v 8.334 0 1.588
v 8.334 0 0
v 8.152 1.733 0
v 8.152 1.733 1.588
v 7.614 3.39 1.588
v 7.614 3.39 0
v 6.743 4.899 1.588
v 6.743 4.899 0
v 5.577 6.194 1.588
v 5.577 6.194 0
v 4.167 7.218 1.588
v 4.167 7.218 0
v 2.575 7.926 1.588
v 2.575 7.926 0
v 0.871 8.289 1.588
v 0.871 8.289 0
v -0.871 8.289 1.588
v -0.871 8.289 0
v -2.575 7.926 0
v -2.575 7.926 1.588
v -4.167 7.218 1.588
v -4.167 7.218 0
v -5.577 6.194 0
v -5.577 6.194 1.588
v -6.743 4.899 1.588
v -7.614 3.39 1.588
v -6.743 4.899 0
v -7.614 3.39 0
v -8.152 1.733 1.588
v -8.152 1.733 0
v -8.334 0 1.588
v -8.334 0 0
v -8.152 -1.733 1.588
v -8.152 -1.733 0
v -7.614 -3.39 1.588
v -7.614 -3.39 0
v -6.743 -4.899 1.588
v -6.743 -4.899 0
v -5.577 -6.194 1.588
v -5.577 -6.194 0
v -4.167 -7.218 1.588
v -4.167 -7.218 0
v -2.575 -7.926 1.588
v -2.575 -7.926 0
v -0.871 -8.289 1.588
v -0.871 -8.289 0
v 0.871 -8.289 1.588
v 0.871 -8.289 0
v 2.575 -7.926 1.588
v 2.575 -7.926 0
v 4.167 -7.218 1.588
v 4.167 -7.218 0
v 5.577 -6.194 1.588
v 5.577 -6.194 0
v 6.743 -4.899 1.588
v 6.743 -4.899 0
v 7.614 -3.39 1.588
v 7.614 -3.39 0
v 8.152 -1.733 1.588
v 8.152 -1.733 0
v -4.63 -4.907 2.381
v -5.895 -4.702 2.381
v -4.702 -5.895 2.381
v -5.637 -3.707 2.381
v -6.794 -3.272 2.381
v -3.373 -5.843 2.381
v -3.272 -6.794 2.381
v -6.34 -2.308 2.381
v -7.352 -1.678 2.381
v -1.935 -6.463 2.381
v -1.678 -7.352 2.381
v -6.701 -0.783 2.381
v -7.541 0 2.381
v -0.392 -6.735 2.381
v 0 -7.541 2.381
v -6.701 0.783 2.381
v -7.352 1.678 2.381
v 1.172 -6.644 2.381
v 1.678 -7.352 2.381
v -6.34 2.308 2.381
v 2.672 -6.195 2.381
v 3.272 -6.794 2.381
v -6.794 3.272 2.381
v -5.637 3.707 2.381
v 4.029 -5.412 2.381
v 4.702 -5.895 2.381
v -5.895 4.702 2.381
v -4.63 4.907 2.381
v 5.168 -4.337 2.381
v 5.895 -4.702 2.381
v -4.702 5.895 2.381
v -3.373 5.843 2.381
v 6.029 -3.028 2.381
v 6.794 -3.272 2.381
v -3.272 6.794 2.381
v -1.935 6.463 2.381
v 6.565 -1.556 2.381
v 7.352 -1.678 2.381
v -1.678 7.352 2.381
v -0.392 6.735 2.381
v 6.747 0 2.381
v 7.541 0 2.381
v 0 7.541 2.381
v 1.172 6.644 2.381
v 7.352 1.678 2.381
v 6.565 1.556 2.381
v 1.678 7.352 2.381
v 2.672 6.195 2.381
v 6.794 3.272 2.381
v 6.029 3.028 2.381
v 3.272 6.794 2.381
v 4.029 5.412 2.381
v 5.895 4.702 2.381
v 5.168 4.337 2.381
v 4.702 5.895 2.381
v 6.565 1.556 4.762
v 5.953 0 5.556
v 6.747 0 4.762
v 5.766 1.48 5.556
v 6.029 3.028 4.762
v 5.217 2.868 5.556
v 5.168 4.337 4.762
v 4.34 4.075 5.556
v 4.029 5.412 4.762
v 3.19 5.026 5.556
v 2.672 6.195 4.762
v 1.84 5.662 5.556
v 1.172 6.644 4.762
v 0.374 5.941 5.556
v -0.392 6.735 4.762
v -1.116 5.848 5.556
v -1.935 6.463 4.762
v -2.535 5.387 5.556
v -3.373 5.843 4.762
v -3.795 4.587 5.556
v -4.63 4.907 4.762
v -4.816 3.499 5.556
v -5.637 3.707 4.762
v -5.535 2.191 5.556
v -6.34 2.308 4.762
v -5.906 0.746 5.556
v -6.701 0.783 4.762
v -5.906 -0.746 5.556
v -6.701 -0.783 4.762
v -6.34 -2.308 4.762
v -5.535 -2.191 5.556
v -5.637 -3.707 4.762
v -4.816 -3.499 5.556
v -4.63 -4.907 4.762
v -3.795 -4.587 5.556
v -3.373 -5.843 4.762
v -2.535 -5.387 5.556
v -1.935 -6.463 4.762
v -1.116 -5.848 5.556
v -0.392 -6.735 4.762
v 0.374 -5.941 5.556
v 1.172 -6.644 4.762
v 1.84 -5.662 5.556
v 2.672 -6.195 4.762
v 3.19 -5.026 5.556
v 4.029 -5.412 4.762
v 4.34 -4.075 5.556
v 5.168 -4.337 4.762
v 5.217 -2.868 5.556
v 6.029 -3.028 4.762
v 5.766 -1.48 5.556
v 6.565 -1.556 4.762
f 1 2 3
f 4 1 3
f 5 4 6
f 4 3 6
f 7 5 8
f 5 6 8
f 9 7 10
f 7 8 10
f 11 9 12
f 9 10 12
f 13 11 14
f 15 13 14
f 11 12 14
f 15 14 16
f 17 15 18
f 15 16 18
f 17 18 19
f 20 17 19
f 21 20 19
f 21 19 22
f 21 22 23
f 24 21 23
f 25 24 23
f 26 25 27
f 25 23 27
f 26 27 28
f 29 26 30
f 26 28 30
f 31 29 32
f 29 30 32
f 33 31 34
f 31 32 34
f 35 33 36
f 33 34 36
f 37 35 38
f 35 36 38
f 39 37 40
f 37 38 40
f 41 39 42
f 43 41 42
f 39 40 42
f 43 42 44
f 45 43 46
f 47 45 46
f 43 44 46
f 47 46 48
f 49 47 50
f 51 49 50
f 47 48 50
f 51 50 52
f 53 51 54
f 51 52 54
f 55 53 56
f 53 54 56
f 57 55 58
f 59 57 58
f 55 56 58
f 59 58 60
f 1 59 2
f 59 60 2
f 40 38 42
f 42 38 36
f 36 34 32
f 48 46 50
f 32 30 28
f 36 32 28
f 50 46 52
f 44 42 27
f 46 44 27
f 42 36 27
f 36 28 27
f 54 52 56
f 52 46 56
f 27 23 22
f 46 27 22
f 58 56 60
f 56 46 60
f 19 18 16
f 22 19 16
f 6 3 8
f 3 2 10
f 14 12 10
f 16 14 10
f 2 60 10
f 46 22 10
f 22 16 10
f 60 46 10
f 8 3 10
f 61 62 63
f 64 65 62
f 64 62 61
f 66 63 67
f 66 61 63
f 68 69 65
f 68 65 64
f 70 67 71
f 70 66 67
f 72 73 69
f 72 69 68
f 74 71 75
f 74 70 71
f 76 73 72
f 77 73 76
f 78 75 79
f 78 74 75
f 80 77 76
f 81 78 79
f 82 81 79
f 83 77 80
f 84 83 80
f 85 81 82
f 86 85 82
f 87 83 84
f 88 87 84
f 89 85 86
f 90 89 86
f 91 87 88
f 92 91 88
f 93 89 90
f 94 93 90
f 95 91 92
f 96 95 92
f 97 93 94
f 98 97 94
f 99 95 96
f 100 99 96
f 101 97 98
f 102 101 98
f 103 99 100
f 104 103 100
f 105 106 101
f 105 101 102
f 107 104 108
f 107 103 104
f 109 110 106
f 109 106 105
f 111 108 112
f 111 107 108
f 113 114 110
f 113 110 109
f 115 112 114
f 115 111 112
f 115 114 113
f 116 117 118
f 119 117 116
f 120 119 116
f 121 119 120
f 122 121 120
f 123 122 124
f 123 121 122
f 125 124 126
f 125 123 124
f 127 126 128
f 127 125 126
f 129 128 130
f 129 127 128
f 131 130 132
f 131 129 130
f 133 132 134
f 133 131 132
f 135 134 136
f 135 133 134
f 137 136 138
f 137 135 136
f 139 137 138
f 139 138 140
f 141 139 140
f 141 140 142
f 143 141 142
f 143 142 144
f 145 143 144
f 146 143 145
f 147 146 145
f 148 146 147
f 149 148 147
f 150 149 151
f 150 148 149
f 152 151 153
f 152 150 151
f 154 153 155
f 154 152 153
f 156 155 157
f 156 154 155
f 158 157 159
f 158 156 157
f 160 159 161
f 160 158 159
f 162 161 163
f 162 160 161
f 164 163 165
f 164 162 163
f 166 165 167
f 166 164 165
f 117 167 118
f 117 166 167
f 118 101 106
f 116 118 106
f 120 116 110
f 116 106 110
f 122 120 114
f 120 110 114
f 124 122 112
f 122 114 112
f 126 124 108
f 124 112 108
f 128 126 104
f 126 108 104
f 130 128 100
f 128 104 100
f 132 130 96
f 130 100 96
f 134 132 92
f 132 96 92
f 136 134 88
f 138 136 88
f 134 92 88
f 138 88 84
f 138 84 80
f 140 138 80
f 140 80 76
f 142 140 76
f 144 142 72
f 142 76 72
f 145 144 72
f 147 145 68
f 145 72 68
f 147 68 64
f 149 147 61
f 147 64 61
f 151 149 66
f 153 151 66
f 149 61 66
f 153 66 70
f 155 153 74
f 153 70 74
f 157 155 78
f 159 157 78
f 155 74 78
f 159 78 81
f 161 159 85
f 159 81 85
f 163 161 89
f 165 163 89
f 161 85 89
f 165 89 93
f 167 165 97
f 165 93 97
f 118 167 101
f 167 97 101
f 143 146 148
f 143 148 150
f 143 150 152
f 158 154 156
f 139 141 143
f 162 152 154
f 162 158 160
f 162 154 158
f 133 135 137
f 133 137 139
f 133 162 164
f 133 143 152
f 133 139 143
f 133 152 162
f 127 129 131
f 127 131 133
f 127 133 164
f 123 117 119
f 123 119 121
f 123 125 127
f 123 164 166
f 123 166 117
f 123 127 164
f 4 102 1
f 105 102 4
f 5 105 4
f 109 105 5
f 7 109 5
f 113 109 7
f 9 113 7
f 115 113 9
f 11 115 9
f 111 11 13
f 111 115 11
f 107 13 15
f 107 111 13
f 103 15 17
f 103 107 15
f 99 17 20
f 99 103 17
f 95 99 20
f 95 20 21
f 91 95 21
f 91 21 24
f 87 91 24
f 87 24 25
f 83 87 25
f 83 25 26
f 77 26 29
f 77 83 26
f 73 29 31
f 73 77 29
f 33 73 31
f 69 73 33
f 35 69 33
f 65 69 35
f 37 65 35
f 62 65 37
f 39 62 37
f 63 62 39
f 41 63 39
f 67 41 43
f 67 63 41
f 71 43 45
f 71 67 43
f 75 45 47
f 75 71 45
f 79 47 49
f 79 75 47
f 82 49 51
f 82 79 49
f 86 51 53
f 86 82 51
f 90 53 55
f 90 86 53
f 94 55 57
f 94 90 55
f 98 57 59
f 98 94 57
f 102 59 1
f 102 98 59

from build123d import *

# Parameters (mm, degrees)
F0_R     = 8.334375
F1_DEPTH = 2.38125
F2_R     = 6.746875
F3_DEPTH = 3.175
F4_SIZE  = 0.79375


with BuildPart() as f1:
    # F0 (on Top) → F1 (new body)
    with BuildSketch(Plane.XY):
        Circle(F0_R)
    extrude(amount=F1_DEPTH)

    # F2 (on face) → F3 (join)
    with BuildSketch(Plane.XY.offset(2.38125)):
        Circle(F2_R)
    extrude(amount=F3_DEPTH)

    # F4
    f4_edges = [f1.edges().sort_by_distance(p)[0] for p in [
        (-8.334375, 0, 2.38125),
        (-6.746875, 0, 5.55625),
    ]]
    chamfer(f4_edges, length=F4_SIZE)


solid = f1.part
